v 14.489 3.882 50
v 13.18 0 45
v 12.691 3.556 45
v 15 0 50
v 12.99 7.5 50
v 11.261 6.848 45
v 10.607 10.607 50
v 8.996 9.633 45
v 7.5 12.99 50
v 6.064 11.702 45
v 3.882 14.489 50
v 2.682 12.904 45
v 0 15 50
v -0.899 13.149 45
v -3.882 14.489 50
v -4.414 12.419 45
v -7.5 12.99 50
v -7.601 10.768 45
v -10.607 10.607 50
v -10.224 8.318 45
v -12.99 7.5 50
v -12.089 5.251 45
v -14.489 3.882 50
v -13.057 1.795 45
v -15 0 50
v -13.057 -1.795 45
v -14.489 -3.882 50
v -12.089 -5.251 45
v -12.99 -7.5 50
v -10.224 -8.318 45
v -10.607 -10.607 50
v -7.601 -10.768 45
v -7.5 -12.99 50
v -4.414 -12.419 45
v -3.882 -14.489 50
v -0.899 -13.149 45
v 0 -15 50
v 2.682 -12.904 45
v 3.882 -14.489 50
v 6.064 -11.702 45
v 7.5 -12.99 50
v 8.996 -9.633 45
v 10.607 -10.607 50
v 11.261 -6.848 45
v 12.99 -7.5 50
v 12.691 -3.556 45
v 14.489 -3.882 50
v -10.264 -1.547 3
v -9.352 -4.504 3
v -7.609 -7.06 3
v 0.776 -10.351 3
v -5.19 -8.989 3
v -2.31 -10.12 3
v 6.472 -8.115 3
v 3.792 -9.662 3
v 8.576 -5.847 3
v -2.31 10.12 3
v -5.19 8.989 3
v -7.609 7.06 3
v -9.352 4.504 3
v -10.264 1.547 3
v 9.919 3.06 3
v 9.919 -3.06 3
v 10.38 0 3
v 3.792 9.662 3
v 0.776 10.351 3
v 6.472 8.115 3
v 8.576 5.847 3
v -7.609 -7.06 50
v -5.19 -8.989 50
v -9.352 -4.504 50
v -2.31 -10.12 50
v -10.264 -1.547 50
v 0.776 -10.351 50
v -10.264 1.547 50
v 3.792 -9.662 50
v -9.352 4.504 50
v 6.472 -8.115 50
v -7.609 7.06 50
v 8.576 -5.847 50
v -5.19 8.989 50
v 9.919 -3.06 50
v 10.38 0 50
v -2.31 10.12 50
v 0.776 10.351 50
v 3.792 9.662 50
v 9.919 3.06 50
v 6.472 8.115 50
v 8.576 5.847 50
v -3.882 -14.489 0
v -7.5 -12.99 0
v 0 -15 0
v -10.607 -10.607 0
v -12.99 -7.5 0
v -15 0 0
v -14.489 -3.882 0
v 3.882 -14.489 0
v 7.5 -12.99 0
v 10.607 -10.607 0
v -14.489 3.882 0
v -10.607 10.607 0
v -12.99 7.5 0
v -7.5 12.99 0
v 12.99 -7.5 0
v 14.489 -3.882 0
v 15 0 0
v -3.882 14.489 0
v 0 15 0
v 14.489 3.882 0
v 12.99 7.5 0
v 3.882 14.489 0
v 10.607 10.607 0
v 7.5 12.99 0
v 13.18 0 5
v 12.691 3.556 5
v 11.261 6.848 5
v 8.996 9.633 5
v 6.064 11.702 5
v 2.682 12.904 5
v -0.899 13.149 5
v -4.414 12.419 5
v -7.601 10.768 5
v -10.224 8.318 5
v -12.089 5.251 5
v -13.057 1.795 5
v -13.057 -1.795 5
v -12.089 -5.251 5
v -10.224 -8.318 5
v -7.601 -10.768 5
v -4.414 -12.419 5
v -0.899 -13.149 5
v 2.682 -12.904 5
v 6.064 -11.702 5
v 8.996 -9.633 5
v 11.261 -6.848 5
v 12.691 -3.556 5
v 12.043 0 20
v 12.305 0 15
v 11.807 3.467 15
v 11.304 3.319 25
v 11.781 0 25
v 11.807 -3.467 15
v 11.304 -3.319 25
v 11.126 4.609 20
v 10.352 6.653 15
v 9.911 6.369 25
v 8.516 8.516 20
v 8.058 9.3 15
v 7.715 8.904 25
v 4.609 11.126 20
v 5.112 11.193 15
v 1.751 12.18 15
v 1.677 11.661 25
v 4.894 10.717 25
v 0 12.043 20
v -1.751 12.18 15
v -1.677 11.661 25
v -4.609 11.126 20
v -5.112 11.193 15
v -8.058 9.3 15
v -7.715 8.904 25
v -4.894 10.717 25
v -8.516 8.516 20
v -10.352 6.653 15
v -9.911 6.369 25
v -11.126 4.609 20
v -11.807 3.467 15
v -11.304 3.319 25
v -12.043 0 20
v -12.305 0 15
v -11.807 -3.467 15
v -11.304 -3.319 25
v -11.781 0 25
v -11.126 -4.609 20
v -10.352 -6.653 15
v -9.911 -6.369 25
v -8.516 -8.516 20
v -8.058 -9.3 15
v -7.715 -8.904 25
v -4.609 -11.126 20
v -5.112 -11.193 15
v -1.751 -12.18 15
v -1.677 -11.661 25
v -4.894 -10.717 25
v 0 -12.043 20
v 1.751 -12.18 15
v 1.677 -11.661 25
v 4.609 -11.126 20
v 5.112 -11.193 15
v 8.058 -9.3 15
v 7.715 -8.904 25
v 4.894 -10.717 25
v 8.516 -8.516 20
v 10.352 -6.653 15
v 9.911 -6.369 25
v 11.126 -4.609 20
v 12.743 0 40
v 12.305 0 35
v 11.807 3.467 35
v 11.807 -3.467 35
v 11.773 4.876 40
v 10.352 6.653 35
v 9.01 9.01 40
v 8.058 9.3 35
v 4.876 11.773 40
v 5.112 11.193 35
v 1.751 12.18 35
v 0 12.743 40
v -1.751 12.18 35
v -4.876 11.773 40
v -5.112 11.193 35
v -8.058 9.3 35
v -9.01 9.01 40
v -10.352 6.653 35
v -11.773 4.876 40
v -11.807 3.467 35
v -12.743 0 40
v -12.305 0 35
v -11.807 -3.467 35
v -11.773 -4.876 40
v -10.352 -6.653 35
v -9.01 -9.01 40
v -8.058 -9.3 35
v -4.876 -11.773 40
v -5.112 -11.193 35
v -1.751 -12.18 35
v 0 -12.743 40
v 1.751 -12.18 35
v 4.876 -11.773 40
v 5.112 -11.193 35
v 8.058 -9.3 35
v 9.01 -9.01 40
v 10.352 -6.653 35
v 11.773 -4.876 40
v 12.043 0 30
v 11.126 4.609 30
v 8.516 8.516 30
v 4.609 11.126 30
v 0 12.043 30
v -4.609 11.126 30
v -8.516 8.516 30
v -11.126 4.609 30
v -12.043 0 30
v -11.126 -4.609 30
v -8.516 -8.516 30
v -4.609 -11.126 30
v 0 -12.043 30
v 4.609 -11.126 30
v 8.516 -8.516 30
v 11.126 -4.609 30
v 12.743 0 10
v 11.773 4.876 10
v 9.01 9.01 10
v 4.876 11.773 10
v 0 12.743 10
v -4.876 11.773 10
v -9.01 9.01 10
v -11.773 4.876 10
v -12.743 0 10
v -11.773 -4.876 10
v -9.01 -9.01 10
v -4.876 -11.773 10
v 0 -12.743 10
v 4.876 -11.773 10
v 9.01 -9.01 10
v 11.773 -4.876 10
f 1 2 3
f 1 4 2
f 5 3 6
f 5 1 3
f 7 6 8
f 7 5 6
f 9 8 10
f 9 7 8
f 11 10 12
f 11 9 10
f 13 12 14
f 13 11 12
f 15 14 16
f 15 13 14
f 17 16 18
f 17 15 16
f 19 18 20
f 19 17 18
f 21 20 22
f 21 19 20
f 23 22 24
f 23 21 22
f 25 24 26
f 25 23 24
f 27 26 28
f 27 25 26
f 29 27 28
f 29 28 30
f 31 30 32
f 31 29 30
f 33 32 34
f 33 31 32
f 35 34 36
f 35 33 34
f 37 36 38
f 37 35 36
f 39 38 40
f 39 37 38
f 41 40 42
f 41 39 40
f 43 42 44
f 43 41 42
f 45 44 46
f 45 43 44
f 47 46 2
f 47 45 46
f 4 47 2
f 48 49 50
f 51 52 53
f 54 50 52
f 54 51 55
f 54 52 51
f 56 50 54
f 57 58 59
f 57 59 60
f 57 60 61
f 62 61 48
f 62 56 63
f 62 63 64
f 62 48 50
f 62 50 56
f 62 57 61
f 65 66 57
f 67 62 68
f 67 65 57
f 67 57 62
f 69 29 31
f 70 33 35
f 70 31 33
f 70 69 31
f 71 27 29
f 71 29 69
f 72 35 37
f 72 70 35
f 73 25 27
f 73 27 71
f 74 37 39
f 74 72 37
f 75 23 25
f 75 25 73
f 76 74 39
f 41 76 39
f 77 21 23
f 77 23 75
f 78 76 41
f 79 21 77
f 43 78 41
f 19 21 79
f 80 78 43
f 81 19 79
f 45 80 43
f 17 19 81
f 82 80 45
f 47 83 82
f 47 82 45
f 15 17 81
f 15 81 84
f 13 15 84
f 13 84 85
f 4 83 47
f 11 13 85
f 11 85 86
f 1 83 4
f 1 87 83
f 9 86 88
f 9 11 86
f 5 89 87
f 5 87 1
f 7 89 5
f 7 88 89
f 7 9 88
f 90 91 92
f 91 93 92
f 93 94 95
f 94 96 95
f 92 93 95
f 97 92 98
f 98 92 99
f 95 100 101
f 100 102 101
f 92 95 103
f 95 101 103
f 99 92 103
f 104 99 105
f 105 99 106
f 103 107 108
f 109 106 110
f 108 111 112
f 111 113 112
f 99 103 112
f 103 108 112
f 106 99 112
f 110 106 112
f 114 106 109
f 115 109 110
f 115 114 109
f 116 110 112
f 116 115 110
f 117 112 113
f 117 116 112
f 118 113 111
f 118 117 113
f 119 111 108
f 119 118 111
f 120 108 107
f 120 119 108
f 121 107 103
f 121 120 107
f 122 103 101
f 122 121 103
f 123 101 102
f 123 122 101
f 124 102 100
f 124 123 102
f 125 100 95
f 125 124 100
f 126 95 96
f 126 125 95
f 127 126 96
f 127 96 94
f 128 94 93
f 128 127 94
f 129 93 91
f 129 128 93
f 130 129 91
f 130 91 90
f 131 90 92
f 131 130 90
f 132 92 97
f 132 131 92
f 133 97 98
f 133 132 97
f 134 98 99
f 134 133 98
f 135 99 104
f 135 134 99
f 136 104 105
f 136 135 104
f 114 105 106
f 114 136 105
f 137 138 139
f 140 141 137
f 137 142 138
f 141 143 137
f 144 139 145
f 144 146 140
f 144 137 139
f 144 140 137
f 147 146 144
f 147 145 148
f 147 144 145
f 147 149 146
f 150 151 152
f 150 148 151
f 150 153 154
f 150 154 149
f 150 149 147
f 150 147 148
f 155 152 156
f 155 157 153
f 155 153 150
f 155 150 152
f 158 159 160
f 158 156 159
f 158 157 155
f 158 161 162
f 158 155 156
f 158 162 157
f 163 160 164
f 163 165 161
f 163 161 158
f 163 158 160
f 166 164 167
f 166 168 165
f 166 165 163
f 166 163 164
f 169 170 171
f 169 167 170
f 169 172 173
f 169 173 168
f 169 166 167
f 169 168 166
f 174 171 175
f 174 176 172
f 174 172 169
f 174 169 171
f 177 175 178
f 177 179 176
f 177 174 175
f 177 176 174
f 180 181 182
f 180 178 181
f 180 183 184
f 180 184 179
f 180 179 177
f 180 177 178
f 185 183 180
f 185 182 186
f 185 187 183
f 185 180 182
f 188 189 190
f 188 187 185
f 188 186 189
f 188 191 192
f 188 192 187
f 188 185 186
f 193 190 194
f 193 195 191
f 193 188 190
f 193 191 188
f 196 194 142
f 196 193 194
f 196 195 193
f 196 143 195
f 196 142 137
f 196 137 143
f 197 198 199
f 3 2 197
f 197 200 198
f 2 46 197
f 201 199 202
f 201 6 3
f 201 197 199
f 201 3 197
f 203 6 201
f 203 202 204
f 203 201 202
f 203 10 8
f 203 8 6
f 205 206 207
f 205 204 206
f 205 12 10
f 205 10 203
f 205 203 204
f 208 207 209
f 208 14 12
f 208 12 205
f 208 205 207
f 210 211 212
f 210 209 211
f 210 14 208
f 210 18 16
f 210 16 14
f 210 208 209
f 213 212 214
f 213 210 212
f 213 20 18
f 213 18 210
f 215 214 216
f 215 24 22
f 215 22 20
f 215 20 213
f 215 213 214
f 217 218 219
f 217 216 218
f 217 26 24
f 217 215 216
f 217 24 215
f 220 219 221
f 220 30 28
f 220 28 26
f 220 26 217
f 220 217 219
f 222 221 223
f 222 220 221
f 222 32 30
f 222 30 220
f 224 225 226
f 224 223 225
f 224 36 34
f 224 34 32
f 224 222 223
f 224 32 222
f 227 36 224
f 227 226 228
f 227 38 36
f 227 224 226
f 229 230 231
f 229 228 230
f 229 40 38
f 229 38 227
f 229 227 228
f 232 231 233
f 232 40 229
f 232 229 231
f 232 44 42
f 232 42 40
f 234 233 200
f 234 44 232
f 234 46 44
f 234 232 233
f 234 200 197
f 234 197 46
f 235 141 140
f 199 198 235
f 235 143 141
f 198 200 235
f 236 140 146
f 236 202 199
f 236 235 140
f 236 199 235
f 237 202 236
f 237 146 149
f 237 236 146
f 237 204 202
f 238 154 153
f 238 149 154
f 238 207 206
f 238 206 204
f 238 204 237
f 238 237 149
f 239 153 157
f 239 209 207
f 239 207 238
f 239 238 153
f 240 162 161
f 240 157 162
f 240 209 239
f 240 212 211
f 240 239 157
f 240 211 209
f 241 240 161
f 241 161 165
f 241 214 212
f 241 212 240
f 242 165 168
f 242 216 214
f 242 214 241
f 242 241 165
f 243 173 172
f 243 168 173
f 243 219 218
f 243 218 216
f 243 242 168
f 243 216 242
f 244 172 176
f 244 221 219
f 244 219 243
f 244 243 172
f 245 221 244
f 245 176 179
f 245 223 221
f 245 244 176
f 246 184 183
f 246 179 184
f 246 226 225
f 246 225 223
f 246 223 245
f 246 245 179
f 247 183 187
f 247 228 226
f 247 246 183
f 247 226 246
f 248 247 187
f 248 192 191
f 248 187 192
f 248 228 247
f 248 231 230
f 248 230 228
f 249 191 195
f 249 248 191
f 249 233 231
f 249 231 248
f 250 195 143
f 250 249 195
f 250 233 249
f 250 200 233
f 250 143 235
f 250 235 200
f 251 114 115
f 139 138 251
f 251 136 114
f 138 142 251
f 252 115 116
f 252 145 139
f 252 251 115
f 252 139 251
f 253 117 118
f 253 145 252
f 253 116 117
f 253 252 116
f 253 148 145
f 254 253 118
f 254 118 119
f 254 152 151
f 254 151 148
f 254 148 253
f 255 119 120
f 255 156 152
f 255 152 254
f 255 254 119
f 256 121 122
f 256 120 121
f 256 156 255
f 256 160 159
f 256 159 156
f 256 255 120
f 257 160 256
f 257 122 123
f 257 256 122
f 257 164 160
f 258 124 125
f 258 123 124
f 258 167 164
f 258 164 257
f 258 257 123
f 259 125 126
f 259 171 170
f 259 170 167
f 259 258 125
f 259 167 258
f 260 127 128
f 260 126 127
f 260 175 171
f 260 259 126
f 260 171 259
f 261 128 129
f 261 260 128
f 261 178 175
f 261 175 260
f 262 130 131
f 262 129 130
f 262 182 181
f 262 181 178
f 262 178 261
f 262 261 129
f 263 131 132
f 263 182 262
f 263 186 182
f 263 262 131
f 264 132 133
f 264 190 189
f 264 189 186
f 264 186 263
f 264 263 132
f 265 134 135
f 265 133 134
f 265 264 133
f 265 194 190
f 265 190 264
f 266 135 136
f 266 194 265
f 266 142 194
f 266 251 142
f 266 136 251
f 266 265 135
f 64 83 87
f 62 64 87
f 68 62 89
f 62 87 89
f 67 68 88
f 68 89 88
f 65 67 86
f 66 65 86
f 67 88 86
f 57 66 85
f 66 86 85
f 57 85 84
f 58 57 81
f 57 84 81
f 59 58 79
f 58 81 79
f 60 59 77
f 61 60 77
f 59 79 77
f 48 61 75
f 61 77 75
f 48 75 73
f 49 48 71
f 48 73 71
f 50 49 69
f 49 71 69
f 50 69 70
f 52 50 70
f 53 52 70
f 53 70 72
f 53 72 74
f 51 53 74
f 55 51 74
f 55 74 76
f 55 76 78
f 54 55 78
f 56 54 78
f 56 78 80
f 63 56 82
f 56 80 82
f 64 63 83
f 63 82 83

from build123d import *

# Parameters (mm, degrees)
F0_R      = 15
F1_DEPTH  = 5
F1_TAPER  = 20
F1_FACE_R = 13.1801488287
F2_DEPTH  = 10
F2_TAPER  = 5
F2_FACE_R = 12.3052621934
F3_DEPTH  = 10
F3_TAPER  = 3
F3_FACE_R = 11.7811844006
F4_DEPTH  = 10
F4_TAPER  = -3
F4_FACE_R = 12.3052621934
F5_DEPTH  = 10
F5_TAPER  = -5
F5_FACE_R = 13.1801488287
F6_DEPTH  = 5
F6_TAPER  = -20
F7_R      = 10.38
F8_DEPTH  = 47


with BuildPart() as f1:
    # F0 (on Top) → F1 (new body)
    with BuildSketch(Plane.XY):
        Circle(F0_R)
    extrude(amount=F1_DEPTH, taper=F1_TAPER)

    # F1_face (on face) → F2 (join)
    with BuildSketch(Plane.XY.offset(5)):
        Circle(F1_FACE_R)
    extrude(amount=F2_DEPTH, taper=F2_TAPER)

    # F2_face (on face) → F3 (join)
    with BuildSketch(Plane.XY.offset(15)):
        Circle(F2_FACE_R)
    extrude(amount=F3_DEPTH, taper=F3_TAPER)

    # F3_face (on face) → F4 (join)
    with BuildSketch(Plane.XY.offset(25)):
        Circle(F3_FACE_R)
    extrude(amount=F4_DEPTH, taper=F4_TAPER)

    # F4_face (on face) → F5 (join)
    with BuildSketch(Plane.XY.offset(35)):
        Circle(F4_FACE_R)
    extrude(amount=F5_DEPTH, taper=F5_TAPER)

    # F5_face (on face) → F6 (join)
    with BuildSketch(Plane.XY.offset(45)):
        Circle(F5_FACE_R)
    extrude(amount=F6_DEPTH, taper=F6_TAPER)

    # F7 (on face) → F8 (cut)
    with BuildSketch(Plane.XY.offset(50)):
        Circle(F7_R)
    extrude(amount=-F8_DEPTH, mode=Mode.SUBTRACT)


solid = f1.part
